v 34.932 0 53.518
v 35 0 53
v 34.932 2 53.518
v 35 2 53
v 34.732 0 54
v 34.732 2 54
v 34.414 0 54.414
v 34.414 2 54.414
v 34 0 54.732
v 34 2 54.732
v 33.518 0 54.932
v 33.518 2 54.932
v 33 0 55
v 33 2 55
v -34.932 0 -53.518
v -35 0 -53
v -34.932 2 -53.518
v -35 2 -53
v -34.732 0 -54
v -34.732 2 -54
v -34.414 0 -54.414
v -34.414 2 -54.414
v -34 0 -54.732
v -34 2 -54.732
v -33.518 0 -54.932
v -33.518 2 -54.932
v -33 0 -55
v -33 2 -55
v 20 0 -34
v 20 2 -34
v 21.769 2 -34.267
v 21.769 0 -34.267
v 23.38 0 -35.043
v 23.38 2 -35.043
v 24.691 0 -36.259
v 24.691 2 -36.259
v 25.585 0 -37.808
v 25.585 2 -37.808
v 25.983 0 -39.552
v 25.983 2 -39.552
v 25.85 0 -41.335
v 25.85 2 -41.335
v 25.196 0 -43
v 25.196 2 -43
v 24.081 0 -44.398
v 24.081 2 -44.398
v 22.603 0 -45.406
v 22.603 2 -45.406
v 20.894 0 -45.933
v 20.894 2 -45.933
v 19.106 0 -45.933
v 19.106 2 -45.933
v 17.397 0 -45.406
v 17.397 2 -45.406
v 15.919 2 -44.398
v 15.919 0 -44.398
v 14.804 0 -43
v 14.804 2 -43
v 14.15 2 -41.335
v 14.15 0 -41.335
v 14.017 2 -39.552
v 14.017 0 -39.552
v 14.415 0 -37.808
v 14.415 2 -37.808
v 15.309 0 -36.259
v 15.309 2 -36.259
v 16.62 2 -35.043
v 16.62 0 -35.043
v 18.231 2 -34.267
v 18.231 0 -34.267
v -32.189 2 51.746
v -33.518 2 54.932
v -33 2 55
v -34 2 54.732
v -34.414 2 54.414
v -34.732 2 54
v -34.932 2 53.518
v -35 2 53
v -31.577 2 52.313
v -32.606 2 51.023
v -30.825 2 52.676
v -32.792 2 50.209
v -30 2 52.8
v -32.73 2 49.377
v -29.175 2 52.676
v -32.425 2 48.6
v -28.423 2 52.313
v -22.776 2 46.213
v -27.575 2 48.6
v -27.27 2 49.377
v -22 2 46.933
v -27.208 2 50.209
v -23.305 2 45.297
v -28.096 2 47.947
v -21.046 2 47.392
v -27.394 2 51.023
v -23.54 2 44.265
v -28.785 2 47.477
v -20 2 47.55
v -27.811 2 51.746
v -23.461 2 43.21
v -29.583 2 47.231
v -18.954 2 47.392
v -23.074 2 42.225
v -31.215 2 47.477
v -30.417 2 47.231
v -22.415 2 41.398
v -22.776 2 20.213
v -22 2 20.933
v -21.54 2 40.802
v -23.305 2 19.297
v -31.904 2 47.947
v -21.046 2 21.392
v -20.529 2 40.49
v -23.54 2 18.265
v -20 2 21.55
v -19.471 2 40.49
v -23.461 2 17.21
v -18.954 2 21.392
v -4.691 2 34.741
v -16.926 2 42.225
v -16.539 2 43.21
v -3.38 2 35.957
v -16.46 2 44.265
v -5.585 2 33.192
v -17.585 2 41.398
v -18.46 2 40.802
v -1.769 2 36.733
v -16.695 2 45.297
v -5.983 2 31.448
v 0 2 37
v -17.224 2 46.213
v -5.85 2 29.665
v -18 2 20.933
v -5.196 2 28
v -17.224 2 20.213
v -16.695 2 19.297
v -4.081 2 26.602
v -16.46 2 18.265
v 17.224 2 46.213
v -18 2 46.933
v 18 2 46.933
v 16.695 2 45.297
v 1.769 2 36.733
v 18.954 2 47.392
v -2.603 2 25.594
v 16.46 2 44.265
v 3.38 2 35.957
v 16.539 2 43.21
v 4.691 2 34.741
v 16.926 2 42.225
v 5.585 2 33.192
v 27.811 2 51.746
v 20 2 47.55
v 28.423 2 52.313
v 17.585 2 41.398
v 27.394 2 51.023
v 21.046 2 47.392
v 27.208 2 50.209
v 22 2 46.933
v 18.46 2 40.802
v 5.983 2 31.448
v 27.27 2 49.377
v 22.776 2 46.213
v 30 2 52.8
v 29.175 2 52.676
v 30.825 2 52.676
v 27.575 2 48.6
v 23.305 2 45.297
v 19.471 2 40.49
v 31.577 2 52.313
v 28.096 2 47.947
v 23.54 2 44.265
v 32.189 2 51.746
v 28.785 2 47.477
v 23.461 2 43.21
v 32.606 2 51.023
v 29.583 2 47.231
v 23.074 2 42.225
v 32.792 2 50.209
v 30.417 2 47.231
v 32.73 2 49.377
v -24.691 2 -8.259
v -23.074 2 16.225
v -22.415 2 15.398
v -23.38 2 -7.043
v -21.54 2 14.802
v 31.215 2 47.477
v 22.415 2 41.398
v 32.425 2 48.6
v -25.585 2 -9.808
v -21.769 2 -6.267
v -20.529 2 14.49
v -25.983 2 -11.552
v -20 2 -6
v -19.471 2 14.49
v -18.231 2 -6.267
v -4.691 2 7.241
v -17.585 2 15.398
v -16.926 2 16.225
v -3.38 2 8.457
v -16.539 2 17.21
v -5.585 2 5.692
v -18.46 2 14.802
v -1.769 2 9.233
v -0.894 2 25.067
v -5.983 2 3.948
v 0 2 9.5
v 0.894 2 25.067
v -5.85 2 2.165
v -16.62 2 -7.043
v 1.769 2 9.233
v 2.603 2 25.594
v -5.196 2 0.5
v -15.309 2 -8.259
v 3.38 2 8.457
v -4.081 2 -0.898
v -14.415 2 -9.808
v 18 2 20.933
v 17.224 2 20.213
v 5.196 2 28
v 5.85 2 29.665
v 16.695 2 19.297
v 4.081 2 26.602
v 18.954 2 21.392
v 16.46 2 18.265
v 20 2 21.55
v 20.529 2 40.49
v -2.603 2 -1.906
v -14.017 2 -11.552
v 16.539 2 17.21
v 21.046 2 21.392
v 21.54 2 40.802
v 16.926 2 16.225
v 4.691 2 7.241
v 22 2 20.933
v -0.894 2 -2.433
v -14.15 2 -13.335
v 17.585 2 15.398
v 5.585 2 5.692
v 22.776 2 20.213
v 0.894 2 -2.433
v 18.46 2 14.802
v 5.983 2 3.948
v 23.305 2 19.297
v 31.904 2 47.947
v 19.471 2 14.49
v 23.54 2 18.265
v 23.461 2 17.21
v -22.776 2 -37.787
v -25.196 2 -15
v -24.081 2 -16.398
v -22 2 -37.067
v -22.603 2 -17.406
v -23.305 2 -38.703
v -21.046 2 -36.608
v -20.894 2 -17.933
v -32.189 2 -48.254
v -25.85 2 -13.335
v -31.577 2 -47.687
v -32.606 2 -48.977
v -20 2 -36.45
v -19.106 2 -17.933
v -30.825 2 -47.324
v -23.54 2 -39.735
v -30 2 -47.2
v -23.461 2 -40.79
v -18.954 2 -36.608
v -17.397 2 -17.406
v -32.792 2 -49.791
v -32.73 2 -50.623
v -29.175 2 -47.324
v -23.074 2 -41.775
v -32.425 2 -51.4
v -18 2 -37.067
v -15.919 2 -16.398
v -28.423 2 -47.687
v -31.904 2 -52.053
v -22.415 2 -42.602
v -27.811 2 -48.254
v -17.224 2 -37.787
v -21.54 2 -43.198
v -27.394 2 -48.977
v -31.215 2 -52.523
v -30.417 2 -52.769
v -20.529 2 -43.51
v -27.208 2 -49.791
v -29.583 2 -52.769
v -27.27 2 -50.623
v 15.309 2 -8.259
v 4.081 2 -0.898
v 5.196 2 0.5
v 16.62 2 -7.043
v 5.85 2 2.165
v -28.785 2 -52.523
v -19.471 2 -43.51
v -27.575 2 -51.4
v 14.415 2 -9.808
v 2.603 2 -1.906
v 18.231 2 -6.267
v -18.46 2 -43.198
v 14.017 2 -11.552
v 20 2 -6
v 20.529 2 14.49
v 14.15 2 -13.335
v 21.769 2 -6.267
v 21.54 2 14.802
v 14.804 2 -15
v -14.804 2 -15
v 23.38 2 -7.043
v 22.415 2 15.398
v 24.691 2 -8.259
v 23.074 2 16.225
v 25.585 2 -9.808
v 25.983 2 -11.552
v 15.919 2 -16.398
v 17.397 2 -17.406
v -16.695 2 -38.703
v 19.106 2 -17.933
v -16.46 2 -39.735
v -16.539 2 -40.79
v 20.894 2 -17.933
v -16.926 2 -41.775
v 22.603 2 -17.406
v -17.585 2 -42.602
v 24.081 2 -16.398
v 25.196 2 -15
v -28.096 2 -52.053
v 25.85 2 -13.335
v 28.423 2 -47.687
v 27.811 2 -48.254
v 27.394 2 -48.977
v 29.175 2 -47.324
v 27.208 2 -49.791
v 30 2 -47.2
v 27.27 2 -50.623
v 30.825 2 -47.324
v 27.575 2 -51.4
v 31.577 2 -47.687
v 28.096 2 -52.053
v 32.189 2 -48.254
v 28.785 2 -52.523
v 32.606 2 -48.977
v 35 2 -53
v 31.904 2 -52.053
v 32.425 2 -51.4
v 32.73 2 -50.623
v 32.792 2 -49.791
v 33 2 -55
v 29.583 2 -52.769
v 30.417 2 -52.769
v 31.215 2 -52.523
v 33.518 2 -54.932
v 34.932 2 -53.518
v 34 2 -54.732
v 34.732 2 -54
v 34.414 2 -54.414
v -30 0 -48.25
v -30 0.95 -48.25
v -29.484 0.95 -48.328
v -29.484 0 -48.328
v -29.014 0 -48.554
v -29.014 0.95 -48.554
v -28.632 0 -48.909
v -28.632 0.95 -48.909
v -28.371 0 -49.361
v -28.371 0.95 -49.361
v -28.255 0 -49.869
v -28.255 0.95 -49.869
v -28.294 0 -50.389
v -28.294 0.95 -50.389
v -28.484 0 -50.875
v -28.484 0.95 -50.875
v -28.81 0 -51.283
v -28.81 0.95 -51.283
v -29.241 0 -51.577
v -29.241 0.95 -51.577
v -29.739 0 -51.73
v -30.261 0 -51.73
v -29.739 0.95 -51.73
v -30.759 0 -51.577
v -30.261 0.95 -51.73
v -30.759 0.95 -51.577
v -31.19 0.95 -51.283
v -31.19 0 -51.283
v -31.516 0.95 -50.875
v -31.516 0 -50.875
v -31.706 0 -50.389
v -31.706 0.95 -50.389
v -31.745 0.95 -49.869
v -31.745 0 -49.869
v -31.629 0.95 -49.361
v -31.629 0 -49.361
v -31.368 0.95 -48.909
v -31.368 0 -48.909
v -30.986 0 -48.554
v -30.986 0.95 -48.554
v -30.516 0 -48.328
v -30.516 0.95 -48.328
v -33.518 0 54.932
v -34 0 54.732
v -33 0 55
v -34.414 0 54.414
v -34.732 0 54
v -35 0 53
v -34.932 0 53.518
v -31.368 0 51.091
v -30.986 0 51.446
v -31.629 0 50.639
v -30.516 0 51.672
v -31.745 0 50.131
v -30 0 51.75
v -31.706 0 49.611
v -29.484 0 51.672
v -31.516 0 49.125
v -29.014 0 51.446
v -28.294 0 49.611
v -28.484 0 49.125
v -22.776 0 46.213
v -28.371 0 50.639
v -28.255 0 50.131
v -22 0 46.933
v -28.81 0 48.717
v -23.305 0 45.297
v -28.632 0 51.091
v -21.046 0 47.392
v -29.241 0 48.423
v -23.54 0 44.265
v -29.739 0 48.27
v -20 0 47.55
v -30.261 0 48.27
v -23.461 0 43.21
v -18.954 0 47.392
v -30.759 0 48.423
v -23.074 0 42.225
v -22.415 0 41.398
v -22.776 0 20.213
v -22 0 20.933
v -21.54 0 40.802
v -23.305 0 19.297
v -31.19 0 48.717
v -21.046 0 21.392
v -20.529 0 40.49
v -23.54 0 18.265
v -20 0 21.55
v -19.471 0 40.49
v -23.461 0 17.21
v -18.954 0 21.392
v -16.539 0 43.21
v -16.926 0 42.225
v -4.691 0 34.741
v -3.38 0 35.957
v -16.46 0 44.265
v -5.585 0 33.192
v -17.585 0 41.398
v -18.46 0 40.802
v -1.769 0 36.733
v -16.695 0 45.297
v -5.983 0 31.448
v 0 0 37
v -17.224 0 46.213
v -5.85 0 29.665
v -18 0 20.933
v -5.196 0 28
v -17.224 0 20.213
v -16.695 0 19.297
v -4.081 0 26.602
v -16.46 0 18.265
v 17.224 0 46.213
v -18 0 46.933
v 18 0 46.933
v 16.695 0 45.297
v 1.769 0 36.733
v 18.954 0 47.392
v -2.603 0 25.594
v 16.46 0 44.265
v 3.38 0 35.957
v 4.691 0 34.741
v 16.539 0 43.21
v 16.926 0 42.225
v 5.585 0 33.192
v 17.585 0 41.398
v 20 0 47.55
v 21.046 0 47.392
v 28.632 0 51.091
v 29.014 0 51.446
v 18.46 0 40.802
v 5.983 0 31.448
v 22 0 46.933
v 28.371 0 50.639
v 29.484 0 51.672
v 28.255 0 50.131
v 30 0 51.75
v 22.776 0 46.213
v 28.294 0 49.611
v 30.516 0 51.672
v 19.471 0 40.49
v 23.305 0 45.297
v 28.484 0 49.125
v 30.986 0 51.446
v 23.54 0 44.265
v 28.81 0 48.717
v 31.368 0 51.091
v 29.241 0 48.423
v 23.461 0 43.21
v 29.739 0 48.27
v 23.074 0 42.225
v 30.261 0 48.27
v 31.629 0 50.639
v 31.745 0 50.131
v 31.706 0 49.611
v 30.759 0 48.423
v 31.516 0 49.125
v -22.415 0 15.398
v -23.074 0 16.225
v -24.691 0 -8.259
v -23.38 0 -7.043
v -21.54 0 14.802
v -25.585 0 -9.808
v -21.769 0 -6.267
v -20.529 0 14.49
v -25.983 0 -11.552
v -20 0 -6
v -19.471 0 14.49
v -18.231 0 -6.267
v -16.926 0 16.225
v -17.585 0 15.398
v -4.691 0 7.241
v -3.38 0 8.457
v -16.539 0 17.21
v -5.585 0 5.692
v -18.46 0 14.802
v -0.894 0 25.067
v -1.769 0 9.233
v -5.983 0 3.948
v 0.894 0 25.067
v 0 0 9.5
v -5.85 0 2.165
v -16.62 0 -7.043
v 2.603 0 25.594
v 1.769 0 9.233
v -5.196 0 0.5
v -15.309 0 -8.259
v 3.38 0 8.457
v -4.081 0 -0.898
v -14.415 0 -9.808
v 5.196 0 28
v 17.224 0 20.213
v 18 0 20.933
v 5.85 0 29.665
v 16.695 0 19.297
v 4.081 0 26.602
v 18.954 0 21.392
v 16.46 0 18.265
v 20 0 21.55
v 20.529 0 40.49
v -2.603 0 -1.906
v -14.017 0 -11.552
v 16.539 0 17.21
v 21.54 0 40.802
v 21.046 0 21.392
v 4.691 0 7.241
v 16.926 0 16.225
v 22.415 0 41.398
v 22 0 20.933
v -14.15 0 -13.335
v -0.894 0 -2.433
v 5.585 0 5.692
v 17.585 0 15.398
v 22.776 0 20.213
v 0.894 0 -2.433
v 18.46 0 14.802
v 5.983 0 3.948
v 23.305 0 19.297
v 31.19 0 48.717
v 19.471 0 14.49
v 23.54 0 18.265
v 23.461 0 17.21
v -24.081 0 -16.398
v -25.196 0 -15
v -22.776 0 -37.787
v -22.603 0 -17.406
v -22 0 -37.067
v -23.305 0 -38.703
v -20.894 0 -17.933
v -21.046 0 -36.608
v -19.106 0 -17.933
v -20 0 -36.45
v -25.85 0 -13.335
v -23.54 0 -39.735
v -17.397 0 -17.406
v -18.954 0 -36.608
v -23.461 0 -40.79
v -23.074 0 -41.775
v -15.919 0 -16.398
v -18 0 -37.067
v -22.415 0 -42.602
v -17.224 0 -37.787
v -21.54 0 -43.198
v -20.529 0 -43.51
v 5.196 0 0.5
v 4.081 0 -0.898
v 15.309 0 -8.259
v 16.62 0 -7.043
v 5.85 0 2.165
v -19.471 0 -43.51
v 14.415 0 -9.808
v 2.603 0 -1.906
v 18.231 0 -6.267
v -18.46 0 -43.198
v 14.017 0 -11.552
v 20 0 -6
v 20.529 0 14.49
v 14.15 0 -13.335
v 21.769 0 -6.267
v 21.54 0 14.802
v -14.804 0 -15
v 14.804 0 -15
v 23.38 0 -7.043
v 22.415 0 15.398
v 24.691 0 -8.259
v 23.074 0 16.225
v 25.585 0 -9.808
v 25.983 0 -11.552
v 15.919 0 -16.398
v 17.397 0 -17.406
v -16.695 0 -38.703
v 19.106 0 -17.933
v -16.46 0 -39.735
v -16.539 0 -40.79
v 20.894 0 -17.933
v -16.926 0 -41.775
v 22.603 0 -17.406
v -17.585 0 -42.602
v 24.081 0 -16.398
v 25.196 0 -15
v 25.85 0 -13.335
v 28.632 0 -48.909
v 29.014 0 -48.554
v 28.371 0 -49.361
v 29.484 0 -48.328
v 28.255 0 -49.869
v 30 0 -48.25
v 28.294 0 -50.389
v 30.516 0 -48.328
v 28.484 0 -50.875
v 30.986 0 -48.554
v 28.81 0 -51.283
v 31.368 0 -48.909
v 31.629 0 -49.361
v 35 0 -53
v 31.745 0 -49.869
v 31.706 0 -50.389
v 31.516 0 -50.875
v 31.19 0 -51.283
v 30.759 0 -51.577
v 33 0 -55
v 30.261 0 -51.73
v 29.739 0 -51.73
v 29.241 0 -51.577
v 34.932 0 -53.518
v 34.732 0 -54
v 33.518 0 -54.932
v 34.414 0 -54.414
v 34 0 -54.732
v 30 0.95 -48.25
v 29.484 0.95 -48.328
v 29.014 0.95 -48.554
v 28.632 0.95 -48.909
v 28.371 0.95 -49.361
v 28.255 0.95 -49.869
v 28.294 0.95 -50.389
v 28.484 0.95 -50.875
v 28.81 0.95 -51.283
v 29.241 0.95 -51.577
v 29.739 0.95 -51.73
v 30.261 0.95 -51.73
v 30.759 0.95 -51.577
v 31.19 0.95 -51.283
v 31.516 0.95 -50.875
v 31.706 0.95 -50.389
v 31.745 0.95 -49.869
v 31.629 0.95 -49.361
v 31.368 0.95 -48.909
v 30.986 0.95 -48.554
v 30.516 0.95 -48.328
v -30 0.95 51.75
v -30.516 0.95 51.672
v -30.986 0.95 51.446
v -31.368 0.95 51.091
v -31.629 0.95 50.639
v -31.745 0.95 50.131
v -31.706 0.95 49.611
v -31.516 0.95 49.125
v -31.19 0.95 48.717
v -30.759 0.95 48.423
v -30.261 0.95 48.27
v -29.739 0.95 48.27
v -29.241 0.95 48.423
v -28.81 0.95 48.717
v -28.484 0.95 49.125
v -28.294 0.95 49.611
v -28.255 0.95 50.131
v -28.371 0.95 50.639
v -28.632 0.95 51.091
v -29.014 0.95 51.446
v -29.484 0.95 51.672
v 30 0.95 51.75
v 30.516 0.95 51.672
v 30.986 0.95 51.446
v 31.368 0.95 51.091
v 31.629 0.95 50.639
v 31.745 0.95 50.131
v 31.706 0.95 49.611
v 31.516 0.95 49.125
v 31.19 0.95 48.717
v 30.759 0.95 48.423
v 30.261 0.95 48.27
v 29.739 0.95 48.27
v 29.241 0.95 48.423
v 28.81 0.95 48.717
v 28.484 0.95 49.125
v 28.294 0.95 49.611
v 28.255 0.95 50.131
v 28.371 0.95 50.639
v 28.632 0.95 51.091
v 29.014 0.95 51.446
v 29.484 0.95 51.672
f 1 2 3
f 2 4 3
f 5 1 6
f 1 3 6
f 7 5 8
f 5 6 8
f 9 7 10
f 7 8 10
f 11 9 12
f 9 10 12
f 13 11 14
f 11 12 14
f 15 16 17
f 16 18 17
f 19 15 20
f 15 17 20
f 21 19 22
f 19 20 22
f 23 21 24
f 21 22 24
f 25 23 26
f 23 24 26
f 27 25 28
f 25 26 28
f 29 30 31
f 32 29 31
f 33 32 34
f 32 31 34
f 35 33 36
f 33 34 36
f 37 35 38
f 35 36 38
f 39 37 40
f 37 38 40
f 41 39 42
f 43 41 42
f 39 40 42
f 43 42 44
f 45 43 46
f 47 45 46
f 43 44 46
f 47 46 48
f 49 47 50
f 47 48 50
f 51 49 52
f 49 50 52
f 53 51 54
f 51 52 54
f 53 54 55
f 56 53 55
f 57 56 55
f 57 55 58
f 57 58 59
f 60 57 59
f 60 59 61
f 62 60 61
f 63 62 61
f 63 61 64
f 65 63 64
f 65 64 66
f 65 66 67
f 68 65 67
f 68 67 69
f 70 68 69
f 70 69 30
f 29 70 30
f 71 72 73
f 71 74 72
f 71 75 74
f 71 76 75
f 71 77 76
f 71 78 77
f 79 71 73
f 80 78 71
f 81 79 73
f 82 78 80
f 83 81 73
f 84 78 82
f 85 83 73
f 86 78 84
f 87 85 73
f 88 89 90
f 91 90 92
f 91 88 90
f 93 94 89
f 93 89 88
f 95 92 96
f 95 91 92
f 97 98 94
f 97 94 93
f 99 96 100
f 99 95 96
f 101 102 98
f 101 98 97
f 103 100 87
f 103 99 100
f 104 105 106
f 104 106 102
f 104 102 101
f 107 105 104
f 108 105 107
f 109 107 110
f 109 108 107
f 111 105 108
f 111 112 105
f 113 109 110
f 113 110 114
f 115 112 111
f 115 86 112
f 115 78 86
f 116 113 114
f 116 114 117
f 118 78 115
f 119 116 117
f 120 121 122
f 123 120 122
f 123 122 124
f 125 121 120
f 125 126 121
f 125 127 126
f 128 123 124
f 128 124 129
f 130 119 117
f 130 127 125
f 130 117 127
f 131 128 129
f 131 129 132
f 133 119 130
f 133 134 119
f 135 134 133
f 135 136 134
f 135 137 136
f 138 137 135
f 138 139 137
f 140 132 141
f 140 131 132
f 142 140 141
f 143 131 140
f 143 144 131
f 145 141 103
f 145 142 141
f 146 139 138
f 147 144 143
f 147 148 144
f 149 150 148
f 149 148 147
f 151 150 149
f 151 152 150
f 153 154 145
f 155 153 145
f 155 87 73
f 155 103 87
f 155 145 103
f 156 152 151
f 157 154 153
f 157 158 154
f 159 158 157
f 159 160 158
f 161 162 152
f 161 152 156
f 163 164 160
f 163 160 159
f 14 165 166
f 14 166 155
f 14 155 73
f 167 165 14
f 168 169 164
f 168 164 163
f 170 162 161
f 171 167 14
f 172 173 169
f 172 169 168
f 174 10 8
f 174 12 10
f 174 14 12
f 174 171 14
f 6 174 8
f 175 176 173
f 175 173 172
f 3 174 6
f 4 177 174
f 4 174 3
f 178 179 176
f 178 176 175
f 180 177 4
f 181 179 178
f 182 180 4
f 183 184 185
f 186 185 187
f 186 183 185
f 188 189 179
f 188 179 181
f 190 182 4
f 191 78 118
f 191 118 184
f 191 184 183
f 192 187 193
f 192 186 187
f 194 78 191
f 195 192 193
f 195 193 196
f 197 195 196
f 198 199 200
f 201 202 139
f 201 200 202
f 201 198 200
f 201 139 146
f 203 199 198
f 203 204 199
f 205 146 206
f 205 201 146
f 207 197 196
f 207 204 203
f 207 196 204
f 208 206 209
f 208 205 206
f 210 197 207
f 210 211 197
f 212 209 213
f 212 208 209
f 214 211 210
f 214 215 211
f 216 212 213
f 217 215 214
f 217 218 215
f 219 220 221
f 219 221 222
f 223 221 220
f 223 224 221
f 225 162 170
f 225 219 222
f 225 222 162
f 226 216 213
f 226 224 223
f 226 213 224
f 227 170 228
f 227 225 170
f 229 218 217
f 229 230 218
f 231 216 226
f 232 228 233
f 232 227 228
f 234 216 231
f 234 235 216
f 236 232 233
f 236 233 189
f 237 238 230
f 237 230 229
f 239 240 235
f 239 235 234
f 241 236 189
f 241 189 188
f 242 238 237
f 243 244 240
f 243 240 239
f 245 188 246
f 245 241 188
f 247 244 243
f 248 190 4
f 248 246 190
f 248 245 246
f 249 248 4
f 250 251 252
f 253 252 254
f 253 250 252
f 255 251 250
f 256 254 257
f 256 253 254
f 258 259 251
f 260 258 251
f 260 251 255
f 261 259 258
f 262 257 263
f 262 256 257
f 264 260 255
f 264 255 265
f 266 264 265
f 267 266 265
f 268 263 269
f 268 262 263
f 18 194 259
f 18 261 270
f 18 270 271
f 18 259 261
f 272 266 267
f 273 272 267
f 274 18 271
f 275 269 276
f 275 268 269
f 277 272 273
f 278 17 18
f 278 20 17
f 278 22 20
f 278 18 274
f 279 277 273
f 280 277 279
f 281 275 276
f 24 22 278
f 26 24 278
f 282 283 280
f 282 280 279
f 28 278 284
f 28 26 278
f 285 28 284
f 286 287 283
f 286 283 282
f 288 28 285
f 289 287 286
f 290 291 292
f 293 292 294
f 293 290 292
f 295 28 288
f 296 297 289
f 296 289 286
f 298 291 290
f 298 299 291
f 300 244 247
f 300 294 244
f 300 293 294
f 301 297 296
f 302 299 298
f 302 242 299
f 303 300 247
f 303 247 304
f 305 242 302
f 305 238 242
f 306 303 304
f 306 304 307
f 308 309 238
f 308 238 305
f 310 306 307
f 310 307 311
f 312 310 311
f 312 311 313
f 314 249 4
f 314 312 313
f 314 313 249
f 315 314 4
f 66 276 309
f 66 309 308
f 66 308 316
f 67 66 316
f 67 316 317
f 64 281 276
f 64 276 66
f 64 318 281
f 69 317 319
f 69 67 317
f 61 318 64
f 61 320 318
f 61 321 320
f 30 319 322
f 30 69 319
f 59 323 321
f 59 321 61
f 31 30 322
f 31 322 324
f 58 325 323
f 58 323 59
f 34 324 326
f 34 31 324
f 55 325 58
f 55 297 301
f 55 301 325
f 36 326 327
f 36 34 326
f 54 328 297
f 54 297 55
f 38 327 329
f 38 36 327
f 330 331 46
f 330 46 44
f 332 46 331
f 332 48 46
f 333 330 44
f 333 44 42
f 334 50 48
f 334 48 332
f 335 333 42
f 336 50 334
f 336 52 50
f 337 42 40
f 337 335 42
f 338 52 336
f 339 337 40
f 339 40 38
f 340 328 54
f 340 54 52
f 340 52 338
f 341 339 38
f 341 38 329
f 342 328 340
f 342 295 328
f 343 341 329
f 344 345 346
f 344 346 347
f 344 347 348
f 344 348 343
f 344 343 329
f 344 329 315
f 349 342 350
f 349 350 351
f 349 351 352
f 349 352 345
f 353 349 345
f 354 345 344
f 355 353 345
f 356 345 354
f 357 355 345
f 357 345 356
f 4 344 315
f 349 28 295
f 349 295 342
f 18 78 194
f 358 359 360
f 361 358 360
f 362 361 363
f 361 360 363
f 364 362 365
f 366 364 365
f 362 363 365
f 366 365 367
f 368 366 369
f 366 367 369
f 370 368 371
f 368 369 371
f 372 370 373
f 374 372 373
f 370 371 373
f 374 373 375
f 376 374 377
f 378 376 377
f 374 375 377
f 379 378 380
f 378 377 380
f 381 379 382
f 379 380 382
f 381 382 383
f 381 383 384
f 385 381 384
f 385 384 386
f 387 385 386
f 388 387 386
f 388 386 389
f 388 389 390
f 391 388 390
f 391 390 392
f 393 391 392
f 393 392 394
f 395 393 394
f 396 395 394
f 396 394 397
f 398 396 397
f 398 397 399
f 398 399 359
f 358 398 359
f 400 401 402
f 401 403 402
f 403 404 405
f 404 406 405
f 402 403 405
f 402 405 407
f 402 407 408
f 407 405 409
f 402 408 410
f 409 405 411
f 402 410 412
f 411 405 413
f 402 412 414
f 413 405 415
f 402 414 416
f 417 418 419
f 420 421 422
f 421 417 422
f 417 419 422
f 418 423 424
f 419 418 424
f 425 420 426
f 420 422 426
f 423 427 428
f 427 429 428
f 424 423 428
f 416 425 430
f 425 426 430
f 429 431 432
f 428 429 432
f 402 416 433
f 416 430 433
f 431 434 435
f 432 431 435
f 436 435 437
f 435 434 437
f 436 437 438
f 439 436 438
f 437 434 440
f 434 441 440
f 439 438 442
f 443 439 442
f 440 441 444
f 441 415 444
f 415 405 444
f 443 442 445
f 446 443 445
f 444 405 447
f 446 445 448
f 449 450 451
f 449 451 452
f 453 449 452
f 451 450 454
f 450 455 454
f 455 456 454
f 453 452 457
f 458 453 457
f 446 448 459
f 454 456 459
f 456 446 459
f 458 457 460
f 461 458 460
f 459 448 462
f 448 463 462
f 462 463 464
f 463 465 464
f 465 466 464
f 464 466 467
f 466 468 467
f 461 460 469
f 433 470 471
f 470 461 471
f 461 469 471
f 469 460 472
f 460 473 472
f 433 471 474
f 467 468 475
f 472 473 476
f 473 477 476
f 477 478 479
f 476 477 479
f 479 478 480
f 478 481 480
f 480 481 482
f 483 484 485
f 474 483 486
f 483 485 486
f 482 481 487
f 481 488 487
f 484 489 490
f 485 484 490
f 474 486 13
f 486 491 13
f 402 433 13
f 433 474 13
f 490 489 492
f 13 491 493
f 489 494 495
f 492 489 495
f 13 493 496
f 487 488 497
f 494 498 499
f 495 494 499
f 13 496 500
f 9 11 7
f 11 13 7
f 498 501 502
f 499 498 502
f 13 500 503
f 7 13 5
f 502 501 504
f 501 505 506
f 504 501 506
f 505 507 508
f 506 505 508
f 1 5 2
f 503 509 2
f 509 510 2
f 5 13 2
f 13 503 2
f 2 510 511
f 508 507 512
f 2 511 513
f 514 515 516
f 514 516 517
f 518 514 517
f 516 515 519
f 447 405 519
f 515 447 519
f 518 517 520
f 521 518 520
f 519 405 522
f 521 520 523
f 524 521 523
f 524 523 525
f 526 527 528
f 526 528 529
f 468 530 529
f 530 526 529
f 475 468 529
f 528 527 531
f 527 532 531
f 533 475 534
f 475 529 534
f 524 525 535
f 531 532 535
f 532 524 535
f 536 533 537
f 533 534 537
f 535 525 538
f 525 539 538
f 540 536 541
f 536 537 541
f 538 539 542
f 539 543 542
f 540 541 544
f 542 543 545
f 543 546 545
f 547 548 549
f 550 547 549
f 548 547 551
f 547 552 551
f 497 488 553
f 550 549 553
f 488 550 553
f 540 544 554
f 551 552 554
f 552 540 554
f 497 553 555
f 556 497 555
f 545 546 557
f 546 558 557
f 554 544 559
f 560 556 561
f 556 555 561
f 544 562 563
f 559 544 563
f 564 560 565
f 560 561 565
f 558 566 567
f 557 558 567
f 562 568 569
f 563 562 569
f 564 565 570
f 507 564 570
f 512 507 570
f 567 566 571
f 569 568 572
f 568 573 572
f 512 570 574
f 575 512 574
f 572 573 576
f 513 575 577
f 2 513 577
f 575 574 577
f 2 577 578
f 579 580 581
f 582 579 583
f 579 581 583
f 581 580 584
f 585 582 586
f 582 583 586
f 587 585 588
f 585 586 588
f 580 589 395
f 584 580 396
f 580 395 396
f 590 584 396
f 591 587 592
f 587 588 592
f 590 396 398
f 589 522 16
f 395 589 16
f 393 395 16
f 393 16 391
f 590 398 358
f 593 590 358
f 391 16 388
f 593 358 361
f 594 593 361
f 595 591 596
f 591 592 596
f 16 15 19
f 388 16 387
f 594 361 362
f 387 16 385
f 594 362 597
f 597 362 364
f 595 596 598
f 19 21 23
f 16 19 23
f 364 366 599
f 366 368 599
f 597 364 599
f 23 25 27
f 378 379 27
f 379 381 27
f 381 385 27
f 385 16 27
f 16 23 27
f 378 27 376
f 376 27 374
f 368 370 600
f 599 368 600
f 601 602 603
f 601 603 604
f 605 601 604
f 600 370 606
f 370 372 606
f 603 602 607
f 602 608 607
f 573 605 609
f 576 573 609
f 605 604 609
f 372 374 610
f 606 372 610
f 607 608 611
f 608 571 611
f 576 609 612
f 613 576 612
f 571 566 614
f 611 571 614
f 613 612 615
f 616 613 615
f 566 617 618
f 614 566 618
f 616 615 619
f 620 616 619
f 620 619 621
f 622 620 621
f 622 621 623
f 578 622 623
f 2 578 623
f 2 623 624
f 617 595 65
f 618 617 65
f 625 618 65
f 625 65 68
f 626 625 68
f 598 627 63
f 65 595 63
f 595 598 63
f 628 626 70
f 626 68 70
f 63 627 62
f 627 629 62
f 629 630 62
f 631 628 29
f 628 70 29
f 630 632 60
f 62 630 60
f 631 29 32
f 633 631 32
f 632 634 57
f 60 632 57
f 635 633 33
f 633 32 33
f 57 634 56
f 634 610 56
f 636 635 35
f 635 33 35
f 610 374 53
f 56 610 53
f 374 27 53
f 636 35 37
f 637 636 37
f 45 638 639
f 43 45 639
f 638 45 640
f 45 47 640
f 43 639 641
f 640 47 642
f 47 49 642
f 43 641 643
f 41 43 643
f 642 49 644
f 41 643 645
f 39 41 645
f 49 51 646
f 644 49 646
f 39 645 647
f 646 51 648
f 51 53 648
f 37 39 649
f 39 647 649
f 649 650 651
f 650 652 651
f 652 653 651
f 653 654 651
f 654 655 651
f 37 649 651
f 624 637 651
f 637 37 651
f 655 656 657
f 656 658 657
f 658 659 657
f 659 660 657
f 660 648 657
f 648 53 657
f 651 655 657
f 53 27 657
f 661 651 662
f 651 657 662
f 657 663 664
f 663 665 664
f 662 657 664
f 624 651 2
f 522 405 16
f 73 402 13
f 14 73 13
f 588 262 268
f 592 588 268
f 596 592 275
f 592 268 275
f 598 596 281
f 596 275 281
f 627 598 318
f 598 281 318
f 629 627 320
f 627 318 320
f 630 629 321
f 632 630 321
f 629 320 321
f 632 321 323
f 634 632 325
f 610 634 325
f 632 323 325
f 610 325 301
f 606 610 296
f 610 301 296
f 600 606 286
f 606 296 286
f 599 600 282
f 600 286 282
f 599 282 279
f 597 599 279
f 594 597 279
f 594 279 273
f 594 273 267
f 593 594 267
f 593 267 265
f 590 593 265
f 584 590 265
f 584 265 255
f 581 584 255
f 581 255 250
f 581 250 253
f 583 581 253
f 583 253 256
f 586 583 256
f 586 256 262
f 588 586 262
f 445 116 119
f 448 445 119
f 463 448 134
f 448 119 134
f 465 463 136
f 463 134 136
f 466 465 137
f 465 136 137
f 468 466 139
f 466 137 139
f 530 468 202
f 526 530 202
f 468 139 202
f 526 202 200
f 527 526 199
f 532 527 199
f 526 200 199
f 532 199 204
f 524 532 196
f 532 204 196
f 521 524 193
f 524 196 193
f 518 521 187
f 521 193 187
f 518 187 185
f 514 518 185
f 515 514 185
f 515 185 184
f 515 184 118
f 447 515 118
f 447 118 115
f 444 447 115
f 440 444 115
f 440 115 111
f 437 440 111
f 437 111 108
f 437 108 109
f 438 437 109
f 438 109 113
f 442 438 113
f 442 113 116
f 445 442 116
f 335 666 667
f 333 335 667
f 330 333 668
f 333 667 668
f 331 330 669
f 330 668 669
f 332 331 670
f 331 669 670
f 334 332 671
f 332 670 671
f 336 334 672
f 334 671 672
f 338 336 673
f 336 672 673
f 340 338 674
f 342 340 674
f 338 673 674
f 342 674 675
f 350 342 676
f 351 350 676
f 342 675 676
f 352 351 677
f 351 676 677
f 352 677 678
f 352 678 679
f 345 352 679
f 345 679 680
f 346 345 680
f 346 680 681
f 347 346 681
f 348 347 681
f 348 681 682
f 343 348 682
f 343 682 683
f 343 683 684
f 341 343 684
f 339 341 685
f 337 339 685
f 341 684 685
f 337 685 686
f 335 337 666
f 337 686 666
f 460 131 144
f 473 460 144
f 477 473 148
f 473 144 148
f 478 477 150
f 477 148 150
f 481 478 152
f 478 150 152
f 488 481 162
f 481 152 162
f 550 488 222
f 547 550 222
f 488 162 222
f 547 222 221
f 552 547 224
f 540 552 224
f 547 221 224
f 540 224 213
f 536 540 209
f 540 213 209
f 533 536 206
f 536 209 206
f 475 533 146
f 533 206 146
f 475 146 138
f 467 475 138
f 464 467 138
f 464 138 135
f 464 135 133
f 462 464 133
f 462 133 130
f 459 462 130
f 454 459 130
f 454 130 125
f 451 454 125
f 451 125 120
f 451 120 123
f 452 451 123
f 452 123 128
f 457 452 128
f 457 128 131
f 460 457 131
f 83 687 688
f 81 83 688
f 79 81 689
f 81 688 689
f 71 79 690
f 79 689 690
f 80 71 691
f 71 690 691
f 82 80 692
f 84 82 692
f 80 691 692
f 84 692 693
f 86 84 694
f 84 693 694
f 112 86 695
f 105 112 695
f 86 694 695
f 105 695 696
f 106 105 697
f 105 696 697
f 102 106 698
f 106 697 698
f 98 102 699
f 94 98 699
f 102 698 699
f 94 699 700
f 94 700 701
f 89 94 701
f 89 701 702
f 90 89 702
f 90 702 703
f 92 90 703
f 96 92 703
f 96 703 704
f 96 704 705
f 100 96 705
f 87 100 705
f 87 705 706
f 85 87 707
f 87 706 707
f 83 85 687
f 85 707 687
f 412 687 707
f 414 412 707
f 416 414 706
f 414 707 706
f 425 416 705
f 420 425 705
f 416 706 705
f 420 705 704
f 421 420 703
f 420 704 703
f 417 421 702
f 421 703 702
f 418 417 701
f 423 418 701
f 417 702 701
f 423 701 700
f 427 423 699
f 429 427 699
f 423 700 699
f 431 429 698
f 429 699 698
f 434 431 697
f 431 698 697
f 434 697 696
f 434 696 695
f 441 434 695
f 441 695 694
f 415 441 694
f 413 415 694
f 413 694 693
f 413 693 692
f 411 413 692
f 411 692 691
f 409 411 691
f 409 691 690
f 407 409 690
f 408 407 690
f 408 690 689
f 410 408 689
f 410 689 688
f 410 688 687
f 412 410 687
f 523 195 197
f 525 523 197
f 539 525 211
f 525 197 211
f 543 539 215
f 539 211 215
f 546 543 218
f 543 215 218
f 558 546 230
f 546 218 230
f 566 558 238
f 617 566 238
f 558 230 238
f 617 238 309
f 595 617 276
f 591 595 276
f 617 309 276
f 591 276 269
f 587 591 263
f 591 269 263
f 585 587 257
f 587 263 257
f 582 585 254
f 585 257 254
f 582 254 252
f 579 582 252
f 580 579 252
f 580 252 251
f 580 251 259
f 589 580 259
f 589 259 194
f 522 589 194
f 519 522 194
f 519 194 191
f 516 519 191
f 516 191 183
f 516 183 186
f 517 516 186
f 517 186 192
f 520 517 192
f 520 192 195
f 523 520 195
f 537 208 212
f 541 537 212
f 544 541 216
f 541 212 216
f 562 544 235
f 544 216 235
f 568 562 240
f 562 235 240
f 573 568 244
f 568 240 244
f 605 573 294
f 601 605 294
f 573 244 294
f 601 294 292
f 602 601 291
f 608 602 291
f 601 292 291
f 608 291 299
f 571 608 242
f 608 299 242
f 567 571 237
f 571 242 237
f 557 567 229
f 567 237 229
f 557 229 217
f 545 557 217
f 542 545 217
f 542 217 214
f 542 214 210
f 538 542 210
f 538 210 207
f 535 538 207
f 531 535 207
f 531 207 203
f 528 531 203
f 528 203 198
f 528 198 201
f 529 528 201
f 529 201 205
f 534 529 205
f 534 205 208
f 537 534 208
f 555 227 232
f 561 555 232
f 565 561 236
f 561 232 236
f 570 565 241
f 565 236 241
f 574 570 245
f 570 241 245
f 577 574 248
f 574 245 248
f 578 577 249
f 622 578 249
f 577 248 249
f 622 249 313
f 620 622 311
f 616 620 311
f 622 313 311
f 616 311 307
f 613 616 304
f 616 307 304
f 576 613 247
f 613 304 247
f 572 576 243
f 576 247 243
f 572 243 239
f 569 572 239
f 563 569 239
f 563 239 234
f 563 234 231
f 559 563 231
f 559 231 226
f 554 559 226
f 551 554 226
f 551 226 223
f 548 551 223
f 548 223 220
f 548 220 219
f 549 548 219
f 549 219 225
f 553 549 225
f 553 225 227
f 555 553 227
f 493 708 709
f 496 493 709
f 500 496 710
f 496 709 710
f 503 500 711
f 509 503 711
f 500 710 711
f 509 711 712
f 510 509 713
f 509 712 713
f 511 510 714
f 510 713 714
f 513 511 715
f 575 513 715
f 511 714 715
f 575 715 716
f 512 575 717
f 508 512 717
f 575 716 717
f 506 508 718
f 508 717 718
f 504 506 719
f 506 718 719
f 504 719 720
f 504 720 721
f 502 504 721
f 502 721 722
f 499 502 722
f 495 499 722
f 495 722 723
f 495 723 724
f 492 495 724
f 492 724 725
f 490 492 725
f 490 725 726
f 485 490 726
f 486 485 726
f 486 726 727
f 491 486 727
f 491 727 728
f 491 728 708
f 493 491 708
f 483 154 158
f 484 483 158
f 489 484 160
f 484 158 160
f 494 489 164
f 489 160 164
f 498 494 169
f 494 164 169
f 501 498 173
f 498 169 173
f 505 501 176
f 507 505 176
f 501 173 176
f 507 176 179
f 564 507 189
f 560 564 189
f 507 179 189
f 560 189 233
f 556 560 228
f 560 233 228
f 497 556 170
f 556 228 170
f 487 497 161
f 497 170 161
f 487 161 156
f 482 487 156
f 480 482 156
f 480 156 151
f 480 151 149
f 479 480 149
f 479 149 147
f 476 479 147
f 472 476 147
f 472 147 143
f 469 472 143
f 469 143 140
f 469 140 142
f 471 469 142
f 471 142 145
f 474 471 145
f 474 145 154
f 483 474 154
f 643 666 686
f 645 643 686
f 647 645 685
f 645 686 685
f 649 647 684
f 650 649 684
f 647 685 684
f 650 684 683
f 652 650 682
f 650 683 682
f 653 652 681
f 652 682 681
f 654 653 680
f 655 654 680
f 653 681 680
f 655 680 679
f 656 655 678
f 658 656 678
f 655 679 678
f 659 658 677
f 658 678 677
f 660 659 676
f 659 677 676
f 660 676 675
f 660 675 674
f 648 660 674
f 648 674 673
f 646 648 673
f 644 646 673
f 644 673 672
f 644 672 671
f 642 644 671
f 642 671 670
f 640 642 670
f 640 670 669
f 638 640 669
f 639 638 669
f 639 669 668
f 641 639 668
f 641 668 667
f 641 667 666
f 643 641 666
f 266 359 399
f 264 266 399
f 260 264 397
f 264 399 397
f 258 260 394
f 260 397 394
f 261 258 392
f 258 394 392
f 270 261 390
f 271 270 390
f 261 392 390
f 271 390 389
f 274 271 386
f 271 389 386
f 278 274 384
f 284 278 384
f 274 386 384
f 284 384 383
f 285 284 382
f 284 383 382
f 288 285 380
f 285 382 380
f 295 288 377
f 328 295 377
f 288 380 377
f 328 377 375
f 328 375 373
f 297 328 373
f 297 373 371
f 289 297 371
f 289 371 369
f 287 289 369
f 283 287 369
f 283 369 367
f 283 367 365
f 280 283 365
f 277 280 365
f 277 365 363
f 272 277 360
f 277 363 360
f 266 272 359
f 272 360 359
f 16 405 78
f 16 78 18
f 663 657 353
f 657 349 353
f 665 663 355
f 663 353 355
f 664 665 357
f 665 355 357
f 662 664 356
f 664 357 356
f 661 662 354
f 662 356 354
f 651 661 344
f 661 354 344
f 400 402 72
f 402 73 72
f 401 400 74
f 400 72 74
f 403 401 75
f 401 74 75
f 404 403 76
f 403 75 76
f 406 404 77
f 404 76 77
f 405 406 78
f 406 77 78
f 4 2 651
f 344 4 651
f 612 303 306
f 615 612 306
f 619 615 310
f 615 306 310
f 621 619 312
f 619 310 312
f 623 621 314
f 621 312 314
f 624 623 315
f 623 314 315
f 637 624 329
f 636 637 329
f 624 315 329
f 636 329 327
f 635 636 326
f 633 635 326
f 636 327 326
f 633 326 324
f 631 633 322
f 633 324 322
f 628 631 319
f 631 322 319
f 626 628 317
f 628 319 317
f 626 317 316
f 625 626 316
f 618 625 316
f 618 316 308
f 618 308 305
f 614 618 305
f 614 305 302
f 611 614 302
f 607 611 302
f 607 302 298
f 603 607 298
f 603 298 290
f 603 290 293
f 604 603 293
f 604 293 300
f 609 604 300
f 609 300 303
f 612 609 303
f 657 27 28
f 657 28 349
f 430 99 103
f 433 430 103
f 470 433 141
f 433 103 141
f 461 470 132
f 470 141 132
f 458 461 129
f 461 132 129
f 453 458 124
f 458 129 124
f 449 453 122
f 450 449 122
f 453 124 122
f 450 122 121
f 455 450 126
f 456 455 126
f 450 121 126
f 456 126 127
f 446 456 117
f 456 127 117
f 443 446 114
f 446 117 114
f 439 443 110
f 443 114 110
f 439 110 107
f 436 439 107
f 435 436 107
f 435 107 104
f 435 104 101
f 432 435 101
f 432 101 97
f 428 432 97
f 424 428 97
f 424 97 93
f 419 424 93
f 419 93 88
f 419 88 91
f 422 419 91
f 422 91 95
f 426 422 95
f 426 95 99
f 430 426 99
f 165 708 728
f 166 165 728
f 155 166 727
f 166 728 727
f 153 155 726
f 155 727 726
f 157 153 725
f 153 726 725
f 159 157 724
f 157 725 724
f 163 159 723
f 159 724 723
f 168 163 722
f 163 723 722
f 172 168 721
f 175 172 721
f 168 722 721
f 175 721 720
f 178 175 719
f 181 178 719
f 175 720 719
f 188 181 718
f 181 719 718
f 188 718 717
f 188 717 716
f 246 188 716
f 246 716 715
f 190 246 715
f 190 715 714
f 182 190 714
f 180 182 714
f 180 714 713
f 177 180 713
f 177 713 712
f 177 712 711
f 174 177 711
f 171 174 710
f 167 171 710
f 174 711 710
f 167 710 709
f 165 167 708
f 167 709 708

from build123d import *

# Parameters (mm, degrees)
FACE_PLATE_W           = 70
FACE_PLATE_H           = 110
FACE_PLATE_EXT_DEPTH   = 2
BUTTONS_R              = 6
BUTTONS_R_2            = 3.55
BUTTONS_CUT_DEPTH      = 10
M3_TOP_SCREW_R         = 1.75
M3_TOP_SCREW_CUT_DEPTH = 10
FILLET1_R              = 2
FILLET2_R              = 2
FILLET3_R              = 2
FILLET4_R              = 2


with BuildPart() as part:
    # Face Plate → Face Plate Ext (new body)
    with BuildSketch(Plane(origin=(0, 0, 0), x_dir=(1, 0, 0), z_dir=(0, 1, 0))):
        Rectangle(FACE_PLATE_W, FACE_PLATE_H)
    extrude(amount=FACE_PLATE_EXT_DEPTH)

    # Buttons → Buttons CUT (cut)
    with BuildSketch(Plane(origin=(0, 2, 0), x_dir=(1, 0, 0), z_dir=(0, 1, 0))):
        with Locations(Location((-20, 12, 0), (0, 0, 270))):
            Circle(BUTTONS_R)
        with Locations(Location((20, 12, 0), (0, 0, 270))):
            Circle(BUTTONS_R)
        with Locations(Location((-20, -18, 0), (0, 0, 270))):
            Circle(BUTTONS_R_2)
        with Locations(Location((-20, -44, 0), (0, 0, 270))):
            Circle(BUTTONS_R_2)
        with Locations(Location((-20, 40, 0), (0, 0, 270))):
            Circle(BUTTONS_R_2)
        with Locations(Location((20, -18, 0), (0, 0, 270))):
            Circle(BUTTONS_R_2)
        with Locations(Location((20, -44, 0), (0, 0, 270))):
            Circle(BUTTONS_R_2)
        with Locations(Location((20, 40, 0), (0, 0, 270))):
            Circle(BUTTONS_R)
        with Locations(Location((0, -31, 0), (0, 0, 270))):
            Circle(BUTTONS_R)
        with Locations(Location((0, -3.5, 0), (0, 0, 270))):
            Circle(BUTTONS_R)
    extrude(amount=-BUTTONS_CUT_DEPTH, mode=Mode.SUBTRACT)

    # M3 Top Screw → M3 Top Screw CUT (cut)
    with BuildSketch(Plane(origin=(0, 2, 0), x_dir=(1, 0, 0), z_dir=(0, 1, 0))):
        with Locations(Location((-30, 50, 0), (0, 0, 270))):
            Circle(M3_TOP_SCREW_R)
        with Locations(Location((30, 50, 0), (0, 0, 270))):
            Circle(M3_TOP_SCREW_R)
        with Locations(Location((-30, -50, 0), (0, 0, 270))):
            Circle(M3_TOP_SCREW_R)
        with Locations(Location((30, -50, 0), (0, 0, 270))):
            Circle(M3_TOP_SCREW_R)
    extrude(amount=-M3_TOP_SCREW_CUT_DEPTH, mode=Mode.SUBTRACT)

    # M3 Head Top CUT cone 1 section (through the dimple's axis) → M3 Head Top CUT (revolve, cut)
    with BuildSketch(Plane(origin=(-30, 2, -50), x_dir=(0, 0, 1), z_dir=(1, 0, 0))):
        Polygon((0, 0), (2.8, 0), (0, 2.8), align=None)
    revolve(axis=Axis((-30, 2, -50), (0, -1, 0)), mode=Mode.SUBTRACT)

    # M3 Head Top CUT cone 2 section (through the dimple's axis) → M3 Head Top CUT cone 2 (revolve, cut)
    with BuildSketch(Plane(origin=(30, 2, -50), x_dir=(0, 0, 1), z_dir=(1, 0, 0))):
        Polygon((0, 0), (2.8, 0), (0, 2.8), align=None)
    revolve(axis=Axis((30, 2, -50), (0, -1, 0)), mode=Mode.SUBTRACT)

    # M3 Head Top CUT cone 3 section (through the dimple's axis) → M3 Head Top CUT cone 3 (revolve, cut)
    with BuildSketch(Plane(origin=(30, 2, 50), x_dir=(0, 0, 1), z_dir=(1, 0, 0))):
        Polygon((0, 0), (2.8, 0), (0, 2.8), align=None)
    revolve(axis=Axis((30, 2, 50), (0, -1, 0)), mode=Mode.SUBTRACT)

    # M3 Head Top CUT cone 4 section (through the dimple's axis) → M3 Head Top CUT cone 4 (revolve, cut)
    with BuildSketch(Plane(origin=(-30, 2, 50), x_dir=(0, 0, 1), z_dir=(1, 0, 0))):
        Polygon((0, 0), (2.8, 0), (0, 2.8), align=None)
    revolve(axis=Axis((-30, 2, 50), (0, -1, 0)), mode=Mode.SUBTRACT)

    # Fillet1
    fillet1_edges = [part.edges().sort_by_distance(p)[0] for p in [
        (-35, 1, -55),
    ]]
    fillet(fillet1_edges, radius=FILLET1_R)

    # Fillet2
    fillet2_edges = [part.edges().sort_by_distance(p)[0] for p in [
        (35, 1, -55),
    ]]
    fillet(fillet2_edges, radius=FILLET2_R)

    # Fillet3
    fillet3_edges = [part.edges().sort_by_distance(p)[0] for p in [
        (35, 1, 55),
    ]]
    fillet(fillet3_edges, radius=FILLET3_R)

    # Fillet4
    fillet4_edges = [part.edges().sort_by_distance(p)[0] for p in [
        (-35, 1, 55),
    ]]
    fillet(fillet4_edges, radius=FILLET4_R)


solid = part.part
